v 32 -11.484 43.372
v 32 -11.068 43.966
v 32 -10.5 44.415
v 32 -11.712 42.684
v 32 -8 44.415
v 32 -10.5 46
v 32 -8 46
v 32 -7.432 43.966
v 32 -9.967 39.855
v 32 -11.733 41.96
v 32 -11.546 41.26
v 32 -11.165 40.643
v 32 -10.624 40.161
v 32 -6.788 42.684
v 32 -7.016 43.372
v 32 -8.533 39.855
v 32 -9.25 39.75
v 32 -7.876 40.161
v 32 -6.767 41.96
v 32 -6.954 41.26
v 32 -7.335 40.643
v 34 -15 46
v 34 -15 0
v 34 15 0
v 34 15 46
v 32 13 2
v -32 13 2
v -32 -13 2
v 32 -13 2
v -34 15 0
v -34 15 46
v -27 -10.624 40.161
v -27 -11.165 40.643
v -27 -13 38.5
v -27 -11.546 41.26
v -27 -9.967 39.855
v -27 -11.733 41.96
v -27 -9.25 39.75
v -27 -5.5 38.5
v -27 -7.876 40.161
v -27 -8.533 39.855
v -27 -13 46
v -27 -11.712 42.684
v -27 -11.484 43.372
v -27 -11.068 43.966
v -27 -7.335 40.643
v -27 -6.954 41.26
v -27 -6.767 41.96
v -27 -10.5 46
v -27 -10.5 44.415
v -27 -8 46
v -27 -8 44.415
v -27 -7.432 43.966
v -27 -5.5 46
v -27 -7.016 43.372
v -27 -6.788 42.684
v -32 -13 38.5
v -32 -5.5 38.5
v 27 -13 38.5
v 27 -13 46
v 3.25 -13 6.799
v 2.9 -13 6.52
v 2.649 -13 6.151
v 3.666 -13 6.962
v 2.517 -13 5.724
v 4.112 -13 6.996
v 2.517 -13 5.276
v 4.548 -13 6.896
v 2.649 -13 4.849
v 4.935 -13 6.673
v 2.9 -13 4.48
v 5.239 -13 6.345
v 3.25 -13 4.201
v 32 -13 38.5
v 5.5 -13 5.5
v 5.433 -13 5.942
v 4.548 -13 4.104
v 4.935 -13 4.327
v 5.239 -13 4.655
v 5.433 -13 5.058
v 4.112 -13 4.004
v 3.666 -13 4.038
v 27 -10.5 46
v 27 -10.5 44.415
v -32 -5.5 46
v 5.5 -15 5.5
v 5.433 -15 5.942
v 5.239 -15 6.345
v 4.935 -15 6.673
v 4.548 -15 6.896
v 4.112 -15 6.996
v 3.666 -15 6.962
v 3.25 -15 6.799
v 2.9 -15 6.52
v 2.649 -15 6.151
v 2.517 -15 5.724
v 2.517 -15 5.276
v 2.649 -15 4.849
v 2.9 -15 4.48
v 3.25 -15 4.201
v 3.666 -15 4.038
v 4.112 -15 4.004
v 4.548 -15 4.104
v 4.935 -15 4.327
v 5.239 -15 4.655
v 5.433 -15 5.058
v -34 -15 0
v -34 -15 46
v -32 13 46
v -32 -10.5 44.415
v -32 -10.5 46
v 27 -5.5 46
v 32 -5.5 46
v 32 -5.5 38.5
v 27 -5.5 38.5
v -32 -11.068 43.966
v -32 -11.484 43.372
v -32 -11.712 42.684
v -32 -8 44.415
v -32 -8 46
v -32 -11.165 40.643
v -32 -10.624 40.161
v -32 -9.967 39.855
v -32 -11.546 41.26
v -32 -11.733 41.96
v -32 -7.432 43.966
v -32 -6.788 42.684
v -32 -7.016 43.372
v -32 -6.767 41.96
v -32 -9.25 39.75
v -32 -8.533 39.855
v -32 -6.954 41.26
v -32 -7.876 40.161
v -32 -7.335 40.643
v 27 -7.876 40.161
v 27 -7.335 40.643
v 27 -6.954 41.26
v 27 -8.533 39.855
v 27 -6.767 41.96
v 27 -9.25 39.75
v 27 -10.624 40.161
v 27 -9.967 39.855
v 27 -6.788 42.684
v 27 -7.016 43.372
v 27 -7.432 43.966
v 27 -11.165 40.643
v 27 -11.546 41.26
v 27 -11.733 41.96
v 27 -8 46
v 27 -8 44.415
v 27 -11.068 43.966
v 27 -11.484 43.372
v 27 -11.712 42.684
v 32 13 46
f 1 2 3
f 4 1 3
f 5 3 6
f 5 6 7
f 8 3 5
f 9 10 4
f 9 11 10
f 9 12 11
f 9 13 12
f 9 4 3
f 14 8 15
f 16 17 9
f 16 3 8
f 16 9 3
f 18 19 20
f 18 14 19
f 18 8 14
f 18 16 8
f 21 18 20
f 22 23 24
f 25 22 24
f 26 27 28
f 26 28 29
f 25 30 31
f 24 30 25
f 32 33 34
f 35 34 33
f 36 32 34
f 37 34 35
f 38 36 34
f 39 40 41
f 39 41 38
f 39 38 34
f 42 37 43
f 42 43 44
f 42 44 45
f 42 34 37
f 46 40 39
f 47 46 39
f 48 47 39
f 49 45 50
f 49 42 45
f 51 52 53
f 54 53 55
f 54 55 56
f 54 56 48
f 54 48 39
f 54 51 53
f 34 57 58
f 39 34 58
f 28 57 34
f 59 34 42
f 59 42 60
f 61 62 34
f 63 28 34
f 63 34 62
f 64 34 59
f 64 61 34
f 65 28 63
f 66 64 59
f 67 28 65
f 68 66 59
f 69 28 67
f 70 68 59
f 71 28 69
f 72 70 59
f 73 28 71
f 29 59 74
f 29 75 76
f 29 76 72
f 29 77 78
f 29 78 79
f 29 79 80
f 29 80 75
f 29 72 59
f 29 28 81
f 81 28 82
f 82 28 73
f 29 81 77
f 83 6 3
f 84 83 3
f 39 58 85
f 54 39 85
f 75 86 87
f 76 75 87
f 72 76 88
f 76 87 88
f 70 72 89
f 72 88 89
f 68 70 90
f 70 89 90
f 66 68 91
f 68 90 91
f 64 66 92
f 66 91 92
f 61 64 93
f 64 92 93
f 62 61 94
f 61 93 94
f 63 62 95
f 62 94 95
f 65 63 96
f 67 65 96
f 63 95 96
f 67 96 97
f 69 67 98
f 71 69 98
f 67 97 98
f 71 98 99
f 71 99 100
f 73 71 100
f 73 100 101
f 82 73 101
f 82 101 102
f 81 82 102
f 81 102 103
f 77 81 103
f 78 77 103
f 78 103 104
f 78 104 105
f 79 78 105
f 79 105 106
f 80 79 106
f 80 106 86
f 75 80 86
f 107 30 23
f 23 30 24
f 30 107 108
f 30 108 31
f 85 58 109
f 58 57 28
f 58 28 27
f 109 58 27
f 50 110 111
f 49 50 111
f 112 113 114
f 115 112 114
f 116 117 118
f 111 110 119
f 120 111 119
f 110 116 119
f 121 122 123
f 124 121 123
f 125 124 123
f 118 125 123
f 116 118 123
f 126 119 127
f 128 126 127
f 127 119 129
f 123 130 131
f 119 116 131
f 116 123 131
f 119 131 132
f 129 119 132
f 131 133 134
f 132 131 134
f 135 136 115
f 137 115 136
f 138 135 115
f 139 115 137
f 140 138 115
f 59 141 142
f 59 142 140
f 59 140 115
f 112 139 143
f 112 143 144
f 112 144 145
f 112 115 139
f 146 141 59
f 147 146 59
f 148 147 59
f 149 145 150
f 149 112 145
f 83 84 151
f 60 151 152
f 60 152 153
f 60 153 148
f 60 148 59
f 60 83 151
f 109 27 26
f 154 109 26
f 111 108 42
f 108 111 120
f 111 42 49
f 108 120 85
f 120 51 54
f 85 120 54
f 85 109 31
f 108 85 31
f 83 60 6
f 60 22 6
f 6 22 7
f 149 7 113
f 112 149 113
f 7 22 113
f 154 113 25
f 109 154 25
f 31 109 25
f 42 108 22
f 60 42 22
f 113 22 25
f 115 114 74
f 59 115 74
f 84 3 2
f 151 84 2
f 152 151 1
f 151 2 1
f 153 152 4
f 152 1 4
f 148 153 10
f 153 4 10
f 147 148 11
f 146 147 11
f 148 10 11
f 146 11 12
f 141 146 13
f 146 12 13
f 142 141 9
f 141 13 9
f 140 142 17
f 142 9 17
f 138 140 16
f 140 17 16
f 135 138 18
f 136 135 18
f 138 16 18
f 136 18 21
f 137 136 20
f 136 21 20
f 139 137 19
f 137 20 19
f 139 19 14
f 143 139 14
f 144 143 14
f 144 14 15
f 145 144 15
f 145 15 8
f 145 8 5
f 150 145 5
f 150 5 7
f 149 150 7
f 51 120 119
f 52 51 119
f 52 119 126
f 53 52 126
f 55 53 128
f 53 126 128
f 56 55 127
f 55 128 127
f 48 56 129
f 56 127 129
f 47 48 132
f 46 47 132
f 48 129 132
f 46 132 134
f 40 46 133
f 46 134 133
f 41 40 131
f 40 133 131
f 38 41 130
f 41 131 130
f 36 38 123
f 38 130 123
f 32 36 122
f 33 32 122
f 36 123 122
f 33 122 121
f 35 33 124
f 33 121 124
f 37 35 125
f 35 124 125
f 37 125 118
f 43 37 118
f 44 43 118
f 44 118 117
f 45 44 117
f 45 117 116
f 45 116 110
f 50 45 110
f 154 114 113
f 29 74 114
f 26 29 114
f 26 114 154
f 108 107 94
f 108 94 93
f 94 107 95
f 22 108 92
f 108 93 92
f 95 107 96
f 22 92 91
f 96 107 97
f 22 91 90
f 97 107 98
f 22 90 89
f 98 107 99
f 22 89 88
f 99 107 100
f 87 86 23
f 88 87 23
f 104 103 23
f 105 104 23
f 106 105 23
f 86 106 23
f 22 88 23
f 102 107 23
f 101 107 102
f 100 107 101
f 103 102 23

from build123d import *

# Parameters (mm, degrees)
F0_W     = 68
F0_H     = 30
F0_W_2   = 64
F0_H_2   = 26
F1_DEPTH = 46
F2_DEPTH = 2
F3_R     = 1.5
F4_DEPTH = 3
F6_DEPTH = 5
F8_DEPTH = 5


with BuildPart() as f1:
    # F0 (on Top) → F1 (new body)
    with BuildSketch(Plane.XY):
        Rectangle(F0_W, F0_H)
        Rectangle(F0_W_2, F0_H_2, mode=Mode.SUBTRACT)
    extrude(amount=F1_DEPTH)

    # F0 (on Top) → F2 (join)
    with BuildSketch(Plane.XY):
        Rectangle(F0_W, F0_H)
        Rectangle(F0_W_2, F0_H_2, mode=Mode.SUBTRACT)
        Rectangle(F0_W_2, F0_H_2)
    extrude(amount=F2_DEPTH)

    # F3 (on face) → F4 (cut)
    with BuildSketch(Plane.XZ.offset(15)):
        with Locations((4, 5.5)):
            Circle(F3_R)
    extrude(amount=-F4_DEPTH, mode=Mode.SUBTRACT)

    # F5 (on face) → F6 (join)
    with BuildSketch(Plane.YZ.offset(-32)):
        with BuildLine():
            Line((-10.5, 46), (-13, 46))
            Line((-13, 46), (-13, 38.5))
            Line((-13, 38.5), (-10.5, 38.5))
            Line((-10.5, 38.5), (-8, 38.5))
            Line((-8, 38.5), (-5.5, 38.5))
            Line((-5.5, 38.5), (-5.5, 46))
            Line((-5.5, 46), (-8, 46))
            Line((-8, 46), (-8, 44.415064))
            ThreePointArc((-8, 44.415064), (-9.25, 39.75), (-10.5, 44.415064))
            Line((-10.5, 44.415064), (-10.5, 46))
        make_face()
    extrude(amount=F6_DEPTH)

    # F7 (on face) → F8 (join)
    with BuildSketch(Plane(origin=(32, 0, 0), x_dir=(0, -1, 0), z_dir=(-1, 0, 0))):
        with BuildLine():
            Line((13, 38.5), (13, 46))
            Line((13, 46), (10.5, 46))
            Line((10.5, 46), (10.5, 44.415064))
            ThreePointArc((10.5, 44.415064), (9.25, 39.75), (8, 44.415064))
            Line((8, 44.415064), (8, 46))
            Line((8, 46), (5.5, 46))
            Line((5.5, 46), (5.5, 38.5))
            Line((5.5, 38.5), (8, 38.5))
            Line((8, 38.5), (10.5, 38.5))
            Line((10.5, 38.5), (13, 38.5))
        make_face()
    extrude(amount=F8_DEPTH)


solid = f1.part
